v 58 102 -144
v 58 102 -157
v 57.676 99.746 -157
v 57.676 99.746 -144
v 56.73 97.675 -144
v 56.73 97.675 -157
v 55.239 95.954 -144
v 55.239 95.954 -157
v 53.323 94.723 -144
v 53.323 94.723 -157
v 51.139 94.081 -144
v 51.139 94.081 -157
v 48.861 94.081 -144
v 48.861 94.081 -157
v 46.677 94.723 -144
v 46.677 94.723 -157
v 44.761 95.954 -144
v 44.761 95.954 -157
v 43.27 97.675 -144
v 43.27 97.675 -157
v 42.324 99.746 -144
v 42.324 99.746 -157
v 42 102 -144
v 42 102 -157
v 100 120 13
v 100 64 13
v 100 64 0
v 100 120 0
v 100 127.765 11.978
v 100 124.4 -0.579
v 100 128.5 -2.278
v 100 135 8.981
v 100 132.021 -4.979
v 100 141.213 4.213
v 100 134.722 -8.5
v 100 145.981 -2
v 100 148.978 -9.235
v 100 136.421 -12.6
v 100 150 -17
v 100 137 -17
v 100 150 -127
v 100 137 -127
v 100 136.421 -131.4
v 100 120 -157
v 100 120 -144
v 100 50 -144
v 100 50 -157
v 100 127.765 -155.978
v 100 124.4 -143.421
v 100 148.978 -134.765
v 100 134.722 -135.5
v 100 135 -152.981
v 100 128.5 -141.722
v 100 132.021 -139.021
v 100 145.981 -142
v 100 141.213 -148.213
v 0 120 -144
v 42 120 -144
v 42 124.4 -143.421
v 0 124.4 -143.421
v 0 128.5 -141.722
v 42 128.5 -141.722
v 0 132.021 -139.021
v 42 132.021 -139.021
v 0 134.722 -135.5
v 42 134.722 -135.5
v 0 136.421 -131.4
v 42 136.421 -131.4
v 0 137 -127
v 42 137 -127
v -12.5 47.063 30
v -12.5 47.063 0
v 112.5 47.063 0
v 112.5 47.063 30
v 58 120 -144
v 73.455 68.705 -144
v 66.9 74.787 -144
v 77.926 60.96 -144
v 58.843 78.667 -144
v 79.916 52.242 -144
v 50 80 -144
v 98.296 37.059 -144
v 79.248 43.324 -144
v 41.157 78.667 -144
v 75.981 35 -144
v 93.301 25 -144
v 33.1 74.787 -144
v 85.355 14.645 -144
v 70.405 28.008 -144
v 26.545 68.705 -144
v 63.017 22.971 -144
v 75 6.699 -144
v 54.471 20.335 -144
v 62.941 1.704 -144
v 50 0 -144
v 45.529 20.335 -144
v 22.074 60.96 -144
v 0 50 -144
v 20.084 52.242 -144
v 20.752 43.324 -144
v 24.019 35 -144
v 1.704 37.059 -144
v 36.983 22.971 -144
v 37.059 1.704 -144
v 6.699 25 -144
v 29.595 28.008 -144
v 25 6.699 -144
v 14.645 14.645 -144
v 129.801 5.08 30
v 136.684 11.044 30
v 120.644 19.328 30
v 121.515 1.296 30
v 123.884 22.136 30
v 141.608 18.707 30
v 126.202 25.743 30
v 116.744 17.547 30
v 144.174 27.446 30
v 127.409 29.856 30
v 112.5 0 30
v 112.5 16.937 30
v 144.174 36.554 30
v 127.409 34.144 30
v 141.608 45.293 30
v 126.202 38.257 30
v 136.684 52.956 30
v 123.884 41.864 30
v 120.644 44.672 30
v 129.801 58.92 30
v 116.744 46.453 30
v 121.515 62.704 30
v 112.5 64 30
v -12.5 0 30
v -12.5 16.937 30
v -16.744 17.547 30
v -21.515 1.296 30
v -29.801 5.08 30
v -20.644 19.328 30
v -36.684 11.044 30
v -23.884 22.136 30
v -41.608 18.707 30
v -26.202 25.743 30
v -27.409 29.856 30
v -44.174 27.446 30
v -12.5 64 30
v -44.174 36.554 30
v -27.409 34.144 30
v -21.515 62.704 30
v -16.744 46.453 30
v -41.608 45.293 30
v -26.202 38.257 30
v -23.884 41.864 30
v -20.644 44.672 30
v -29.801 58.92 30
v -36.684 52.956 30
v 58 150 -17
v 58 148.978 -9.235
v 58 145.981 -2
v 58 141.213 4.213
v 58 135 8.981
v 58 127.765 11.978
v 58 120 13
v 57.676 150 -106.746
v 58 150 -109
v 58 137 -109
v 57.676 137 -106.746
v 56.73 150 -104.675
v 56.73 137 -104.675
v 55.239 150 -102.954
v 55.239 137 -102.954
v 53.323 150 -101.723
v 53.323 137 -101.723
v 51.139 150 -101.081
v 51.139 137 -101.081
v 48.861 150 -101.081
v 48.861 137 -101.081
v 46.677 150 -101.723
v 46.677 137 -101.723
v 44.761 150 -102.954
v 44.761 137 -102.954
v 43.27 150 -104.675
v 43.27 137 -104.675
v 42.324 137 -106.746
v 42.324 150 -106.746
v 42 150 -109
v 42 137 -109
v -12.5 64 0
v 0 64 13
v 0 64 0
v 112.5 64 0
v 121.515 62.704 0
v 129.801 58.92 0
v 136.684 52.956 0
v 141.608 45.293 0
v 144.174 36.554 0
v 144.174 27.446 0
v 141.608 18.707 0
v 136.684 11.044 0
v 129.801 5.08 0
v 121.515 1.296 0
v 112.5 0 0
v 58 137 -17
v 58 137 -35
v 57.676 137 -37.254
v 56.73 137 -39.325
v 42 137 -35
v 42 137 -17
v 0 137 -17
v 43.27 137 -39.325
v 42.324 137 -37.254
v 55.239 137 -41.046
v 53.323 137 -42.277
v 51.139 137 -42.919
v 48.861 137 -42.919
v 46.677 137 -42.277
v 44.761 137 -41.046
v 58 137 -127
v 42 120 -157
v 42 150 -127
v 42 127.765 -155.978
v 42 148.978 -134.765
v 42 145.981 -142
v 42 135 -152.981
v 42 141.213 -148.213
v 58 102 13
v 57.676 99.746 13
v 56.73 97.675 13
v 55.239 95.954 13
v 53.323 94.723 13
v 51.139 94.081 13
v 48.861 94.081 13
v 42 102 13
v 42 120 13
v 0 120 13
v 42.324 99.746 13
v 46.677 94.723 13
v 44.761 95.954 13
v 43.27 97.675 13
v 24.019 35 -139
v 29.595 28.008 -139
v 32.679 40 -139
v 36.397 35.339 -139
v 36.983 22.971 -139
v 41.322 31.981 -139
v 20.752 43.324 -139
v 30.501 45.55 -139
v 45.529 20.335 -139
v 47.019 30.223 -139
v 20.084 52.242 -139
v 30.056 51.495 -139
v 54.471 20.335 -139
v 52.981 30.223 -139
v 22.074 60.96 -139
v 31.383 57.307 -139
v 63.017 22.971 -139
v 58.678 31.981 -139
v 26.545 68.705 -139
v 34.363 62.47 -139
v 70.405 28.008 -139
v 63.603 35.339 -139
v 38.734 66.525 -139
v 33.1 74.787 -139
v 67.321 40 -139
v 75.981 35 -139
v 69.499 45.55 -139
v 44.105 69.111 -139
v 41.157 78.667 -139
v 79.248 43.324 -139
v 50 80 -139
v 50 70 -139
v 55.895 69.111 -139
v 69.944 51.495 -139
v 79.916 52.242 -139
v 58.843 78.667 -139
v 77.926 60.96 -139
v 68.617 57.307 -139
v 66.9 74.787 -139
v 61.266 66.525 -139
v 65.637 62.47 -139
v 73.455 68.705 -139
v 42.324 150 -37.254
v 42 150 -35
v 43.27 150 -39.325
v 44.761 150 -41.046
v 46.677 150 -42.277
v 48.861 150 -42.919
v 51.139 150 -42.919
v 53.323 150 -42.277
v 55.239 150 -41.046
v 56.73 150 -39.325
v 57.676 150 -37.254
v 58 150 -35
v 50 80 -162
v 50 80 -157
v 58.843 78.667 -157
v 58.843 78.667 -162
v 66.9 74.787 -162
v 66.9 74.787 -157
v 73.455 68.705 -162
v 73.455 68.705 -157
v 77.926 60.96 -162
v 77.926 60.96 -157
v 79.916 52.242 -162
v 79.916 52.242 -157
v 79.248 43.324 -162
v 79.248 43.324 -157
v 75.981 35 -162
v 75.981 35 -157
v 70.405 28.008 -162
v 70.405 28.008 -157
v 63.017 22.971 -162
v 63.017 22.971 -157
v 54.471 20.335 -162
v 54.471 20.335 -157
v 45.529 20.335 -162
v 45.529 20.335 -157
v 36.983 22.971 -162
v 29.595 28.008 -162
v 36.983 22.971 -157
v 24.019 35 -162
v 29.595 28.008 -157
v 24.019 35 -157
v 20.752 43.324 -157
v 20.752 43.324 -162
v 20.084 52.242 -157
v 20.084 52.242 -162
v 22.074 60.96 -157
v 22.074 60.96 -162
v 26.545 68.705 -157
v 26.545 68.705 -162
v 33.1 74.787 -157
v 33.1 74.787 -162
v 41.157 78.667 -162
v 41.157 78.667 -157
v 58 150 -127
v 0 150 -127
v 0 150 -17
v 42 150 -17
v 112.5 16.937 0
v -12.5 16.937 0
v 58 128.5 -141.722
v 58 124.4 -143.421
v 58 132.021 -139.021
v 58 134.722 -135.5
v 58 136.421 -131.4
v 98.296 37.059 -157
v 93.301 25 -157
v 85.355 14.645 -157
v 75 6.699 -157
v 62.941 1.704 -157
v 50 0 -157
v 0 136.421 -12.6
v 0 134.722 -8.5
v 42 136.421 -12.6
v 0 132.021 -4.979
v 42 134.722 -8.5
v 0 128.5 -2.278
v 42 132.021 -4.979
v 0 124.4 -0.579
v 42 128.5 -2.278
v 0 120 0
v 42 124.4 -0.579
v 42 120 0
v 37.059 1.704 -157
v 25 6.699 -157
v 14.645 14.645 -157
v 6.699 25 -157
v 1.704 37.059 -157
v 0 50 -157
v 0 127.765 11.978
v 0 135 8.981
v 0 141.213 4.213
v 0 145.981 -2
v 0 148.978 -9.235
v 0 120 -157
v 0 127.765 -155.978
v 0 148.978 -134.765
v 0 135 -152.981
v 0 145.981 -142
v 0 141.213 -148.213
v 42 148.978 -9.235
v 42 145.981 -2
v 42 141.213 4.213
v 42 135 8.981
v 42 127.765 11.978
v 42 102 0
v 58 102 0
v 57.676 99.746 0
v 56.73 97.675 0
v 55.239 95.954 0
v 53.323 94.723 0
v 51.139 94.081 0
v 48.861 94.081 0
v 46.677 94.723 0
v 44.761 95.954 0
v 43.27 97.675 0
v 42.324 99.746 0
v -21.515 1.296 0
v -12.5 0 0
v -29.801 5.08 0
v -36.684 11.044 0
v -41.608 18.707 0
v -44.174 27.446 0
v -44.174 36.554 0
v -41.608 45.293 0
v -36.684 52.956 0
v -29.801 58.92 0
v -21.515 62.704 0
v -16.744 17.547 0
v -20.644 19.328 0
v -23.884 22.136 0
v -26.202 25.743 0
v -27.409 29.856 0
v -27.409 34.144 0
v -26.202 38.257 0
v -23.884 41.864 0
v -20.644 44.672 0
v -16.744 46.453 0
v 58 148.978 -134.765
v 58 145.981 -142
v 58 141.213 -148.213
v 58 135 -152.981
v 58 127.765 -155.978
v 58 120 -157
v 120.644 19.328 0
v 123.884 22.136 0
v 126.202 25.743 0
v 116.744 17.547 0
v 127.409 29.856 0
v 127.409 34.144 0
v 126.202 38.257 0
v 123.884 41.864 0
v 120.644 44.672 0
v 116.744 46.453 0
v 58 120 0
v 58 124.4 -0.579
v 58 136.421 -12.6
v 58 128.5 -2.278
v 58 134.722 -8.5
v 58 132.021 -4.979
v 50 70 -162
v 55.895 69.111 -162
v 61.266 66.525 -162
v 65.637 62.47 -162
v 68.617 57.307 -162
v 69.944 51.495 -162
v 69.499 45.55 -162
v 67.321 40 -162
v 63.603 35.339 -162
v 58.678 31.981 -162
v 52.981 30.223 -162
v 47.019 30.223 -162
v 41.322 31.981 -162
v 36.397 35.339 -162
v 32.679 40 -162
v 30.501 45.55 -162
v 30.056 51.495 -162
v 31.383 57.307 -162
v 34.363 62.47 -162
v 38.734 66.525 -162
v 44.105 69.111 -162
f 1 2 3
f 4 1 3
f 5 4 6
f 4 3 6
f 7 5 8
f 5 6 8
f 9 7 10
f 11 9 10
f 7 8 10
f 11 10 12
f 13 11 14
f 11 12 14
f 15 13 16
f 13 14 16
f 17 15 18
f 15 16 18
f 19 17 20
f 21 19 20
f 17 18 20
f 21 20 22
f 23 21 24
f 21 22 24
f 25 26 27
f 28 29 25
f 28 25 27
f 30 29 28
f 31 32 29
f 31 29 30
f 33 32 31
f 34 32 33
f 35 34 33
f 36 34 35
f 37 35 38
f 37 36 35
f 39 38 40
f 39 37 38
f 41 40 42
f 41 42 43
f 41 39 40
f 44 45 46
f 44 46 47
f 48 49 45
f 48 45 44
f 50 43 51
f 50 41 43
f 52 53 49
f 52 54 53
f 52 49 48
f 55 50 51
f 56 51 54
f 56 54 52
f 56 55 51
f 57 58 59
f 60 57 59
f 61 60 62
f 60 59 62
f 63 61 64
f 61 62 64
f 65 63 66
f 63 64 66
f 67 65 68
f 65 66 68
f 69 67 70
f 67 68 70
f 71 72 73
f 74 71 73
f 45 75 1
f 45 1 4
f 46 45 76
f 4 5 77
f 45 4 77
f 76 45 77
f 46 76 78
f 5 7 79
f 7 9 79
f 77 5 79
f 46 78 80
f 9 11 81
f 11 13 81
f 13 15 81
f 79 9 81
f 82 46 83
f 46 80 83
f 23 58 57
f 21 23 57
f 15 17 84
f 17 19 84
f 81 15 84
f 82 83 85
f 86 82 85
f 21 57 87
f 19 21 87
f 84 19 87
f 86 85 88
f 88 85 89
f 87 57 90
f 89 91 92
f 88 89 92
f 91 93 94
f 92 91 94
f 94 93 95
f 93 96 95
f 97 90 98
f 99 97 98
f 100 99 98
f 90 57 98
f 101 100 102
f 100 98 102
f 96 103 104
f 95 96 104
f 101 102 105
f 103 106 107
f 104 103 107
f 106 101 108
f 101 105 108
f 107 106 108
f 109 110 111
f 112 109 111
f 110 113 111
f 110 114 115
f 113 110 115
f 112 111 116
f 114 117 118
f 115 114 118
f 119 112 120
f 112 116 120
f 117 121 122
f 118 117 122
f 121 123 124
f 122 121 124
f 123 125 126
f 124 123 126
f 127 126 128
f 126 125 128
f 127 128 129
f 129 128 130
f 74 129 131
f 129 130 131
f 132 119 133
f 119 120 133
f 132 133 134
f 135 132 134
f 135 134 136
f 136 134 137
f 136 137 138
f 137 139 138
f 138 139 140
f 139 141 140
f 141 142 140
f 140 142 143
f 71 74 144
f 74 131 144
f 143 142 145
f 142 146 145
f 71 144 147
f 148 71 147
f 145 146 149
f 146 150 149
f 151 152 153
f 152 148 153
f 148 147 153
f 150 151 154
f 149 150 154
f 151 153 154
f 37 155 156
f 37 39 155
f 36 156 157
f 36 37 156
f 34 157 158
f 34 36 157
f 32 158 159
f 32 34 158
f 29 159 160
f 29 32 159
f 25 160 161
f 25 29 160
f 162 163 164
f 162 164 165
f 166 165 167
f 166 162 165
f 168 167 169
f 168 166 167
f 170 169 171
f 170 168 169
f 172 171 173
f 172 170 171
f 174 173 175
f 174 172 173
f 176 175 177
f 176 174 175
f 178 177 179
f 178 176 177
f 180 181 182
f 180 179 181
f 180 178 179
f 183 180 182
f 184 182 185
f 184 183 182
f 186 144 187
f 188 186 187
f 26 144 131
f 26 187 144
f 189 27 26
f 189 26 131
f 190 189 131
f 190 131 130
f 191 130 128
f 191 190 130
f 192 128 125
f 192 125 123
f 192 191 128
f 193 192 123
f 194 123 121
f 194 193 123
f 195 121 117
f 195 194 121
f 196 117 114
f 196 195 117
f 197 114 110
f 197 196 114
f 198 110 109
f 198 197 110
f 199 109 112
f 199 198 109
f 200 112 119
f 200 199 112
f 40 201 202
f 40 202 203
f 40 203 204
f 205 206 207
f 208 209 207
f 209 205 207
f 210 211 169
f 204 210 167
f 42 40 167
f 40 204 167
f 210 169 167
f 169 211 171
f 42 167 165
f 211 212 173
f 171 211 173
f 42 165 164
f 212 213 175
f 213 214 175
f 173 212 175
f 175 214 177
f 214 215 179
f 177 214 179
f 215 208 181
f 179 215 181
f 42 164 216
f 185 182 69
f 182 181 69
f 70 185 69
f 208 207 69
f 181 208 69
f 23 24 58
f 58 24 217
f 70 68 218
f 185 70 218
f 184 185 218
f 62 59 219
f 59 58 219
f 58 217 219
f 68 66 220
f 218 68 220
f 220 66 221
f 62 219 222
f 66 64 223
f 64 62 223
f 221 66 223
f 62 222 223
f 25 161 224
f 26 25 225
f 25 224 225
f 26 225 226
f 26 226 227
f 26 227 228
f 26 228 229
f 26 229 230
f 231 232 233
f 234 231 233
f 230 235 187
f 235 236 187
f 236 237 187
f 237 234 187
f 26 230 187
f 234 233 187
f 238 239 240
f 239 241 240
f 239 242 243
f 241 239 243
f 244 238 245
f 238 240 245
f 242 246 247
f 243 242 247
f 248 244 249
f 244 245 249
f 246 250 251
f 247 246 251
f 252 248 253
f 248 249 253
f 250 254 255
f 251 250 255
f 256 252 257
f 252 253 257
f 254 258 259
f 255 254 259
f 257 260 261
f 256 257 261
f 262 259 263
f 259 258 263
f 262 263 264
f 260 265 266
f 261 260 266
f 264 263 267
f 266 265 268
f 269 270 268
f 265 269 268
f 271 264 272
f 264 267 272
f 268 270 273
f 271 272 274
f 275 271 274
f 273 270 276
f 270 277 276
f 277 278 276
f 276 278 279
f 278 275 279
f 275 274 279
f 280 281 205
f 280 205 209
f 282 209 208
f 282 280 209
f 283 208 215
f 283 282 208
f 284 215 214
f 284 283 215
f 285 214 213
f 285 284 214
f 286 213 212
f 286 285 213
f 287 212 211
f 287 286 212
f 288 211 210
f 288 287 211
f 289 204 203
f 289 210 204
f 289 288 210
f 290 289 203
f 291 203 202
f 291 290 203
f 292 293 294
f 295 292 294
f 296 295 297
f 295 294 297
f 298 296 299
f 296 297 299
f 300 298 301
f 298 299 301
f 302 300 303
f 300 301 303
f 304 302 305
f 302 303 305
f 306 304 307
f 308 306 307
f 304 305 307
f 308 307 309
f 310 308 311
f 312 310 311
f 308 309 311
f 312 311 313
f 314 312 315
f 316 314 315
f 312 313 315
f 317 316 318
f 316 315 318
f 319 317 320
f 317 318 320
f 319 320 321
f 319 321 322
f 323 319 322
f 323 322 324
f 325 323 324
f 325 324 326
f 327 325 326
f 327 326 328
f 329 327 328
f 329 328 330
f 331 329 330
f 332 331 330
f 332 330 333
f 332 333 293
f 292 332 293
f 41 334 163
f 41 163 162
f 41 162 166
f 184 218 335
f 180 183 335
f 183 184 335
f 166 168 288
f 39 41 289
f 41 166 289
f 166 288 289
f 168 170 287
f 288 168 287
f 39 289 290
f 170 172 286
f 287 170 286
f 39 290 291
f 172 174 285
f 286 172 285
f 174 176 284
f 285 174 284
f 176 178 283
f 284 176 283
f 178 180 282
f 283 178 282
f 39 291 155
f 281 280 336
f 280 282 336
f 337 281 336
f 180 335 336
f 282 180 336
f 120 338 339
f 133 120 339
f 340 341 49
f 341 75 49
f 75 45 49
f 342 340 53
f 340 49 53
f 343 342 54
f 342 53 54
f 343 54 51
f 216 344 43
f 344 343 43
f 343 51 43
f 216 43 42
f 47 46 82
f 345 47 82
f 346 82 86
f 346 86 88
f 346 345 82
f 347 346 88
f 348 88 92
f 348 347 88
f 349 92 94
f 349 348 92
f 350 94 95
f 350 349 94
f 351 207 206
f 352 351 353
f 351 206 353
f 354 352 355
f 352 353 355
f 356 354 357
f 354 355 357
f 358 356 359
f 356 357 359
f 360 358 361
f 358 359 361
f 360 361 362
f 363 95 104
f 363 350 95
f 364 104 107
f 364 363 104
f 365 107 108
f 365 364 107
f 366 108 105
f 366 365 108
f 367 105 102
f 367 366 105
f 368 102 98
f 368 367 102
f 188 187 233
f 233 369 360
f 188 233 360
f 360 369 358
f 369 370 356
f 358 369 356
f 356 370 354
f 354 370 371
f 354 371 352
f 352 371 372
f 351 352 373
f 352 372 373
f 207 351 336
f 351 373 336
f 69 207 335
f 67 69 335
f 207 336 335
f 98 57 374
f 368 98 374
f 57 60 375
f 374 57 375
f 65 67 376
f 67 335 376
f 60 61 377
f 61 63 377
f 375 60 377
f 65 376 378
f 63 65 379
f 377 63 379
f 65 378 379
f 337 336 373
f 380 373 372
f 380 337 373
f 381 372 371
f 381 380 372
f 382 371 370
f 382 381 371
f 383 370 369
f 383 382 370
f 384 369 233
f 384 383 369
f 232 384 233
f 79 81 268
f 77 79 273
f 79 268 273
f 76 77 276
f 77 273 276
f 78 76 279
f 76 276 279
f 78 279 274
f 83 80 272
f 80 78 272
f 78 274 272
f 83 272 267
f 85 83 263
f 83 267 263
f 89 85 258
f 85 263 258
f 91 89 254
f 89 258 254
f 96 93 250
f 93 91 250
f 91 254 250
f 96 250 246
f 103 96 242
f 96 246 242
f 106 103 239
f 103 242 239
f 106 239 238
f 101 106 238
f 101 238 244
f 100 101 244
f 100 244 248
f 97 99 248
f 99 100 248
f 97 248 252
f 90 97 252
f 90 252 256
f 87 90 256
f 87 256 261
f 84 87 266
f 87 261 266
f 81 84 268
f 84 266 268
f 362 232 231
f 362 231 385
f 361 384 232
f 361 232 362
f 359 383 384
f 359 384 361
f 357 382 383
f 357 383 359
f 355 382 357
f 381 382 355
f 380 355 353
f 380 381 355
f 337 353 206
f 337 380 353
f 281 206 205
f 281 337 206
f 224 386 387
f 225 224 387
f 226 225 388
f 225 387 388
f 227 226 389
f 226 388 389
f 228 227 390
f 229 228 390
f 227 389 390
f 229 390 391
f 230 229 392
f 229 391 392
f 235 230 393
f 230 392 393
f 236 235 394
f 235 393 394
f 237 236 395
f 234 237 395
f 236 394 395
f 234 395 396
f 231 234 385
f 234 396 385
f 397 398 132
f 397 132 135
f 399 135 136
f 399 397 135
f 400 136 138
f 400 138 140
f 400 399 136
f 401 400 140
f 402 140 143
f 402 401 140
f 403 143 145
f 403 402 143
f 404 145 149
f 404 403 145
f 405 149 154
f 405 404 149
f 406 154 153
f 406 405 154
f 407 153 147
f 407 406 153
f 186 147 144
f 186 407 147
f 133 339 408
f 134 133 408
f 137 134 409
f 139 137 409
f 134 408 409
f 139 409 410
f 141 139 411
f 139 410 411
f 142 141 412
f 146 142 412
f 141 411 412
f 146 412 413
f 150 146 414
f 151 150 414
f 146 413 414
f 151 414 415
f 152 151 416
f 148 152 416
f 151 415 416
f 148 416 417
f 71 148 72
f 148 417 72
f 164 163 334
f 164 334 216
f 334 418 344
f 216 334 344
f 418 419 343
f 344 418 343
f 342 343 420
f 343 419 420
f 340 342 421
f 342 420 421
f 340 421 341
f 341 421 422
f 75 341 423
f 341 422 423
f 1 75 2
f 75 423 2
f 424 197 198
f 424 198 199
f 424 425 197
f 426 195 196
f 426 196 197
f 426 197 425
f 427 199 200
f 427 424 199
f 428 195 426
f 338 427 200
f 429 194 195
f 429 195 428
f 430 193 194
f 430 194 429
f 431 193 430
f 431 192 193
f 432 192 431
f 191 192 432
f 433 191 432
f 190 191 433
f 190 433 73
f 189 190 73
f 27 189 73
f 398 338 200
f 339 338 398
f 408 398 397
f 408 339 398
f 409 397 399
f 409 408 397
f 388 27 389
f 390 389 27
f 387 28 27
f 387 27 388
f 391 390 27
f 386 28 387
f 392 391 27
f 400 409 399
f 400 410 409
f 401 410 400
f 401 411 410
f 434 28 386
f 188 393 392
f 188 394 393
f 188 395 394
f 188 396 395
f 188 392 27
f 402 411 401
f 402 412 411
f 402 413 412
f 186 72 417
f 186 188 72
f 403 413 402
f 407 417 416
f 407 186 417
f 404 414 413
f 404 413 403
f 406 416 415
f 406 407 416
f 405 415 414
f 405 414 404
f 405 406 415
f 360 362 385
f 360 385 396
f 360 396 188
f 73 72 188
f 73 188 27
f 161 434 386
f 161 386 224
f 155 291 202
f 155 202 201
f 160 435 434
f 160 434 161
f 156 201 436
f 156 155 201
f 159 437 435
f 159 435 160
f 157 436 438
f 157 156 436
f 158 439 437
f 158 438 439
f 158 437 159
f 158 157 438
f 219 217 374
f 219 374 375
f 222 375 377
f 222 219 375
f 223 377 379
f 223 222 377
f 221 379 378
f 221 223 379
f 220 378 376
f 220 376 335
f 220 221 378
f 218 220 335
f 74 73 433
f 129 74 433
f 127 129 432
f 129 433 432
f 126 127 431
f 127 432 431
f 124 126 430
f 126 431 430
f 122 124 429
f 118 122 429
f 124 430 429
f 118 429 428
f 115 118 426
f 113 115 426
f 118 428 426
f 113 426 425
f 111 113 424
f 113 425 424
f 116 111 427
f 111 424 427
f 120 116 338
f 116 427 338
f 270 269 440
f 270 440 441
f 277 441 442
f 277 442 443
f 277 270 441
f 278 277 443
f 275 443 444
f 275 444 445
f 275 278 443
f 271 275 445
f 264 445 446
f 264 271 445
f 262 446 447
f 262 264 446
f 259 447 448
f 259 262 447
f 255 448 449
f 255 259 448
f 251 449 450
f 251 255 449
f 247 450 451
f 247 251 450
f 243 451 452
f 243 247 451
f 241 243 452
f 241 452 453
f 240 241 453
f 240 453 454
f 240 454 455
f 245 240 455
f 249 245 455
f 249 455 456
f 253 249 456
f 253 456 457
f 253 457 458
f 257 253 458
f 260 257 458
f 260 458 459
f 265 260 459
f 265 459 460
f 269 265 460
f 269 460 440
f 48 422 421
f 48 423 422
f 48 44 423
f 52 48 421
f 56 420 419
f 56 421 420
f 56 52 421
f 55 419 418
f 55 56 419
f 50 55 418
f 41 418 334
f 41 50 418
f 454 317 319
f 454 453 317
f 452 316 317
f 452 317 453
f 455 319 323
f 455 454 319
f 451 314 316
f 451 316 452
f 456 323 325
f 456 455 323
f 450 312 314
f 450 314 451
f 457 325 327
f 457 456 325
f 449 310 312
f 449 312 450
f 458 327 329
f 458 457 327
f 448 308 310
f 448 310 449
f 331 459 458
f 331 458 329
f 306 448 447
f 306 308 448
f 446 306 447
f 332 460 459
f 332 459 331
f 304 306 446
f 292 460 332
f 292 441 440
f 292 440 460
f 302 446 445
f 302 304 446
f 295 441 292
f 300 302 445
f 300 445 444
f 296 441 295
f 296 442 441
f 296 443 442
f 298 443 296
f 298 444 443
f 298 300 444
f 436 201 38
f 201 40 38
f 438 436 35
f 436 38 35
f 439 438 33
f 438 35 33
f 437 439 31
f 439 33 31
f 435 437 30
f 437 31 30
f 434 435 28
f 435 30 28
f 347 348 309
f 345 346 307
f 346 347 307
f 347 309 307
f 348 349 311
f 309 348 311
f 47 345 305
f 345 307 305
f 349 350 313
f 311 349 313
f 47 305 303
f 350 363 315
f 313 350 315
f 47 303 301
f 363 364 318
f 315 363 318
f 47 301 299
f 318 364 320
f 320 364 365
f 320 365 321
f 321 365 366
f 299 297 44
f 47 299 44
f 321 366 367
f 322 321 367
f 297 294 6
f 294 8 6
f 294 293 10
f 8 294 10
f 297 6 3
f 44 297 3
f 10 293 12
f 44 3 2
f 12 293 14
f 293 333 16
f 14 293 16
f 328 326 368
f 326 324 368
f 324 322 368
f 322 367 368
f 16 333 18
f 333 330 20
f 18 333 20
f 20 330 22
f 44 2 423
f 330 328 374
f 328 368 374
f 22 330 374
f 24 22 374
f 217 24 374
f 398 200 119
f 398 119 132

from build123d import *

# Parameters (mm, degrees)
BOSS_EXTRUDE1_DEPTH      = 100
FILLET1_R                = 30
FILLET2_R                = 17
BOSS_EXTRUDE2_DEPTH      = 17
BOSS_EXTRUDE2_DEPTH_BACK = 13
CUT_EXTRUDE1_START       = -17
SKETCH2_4_W              = 100
SKETCH2_4_H              = 30.125527048
CUT_EXTRUDE1_DEPTH       = 17
FILLET3_R                = 50
BOSS_EXTRUDE3_DEPTH      = 5
BOSS_EXTRUDE3_DEPTH_BACK = 18
SKETCH3_R                = 30
SKETCH3_R_2              = 20
SKETCH3_2_R              = 20
CUT_EXTRUDE2_DEPTH       = 25
CUT_EXTRUDE3_DEPTH       = 25
CUT_EXTRUDE4_DEPTH       = 25
CUT_EXTRUDE5_START       = -25
CUT_EXTRUDE5_DEPTH       = 25


with BuildPart() as part:
    # Sketch1 → Boss-Extrude1 (new body)
    with BuildSketch(Plane(origin=(0, 0, 0), x_dir=(0, 0, -1), z_dir=(1, 0, 0))):
        Polygon((0, 0), (0, 137), (144, 137), (144, 0), (157, 0), (157, 150), (-13, 150), (-13, 0), align=None)
    extrude(amount=BOSS_EXTRUDE1_DEPTH)

    # Fillet1
    fillet1_edges = [part.edges().sort_by_distance(p)[0] for p in [
        (50, 150, -157),
        (50, 150, 13),
    ]]
    fillet(fillet1_edges, radius=FILLET1_R)

    # Fillet2
    fillet2_edges = [part.edges().sort_by_distance(p)[0] for p in [
        (50, 137, 0),
        (50, 137, -144),
    ]]
    fillet(fillet2_edges, radius=FILLET2_R)

    # Sketch2 → Boss-Extrude2 (add, two sides: drawn at the far end of the back side and taken through both)
    with BuildSketch(Plane.XY.offset(13).offset(-BOSS_EXTRUDE2_DEPTH_BACK)):
        with BuildLine():
            Line((-12.5, 64), (112.5, 64))
            ThreePointArc((112.5, 64), (144.5, 32), (112.5, 0))
            Line((112.5, 0), (-12.5, 0))
            ThreePointArc((-12.5, 0), (-44.5, 32), (-12.5, 64))
        make_face()
        with BuildLine():
            Line((-12.5, 47.062763524), (112.5, 47.062763524))
            ThreePointArc((112.5, 47.062763524), (127.562763524, 32), (112.5, 16.937236476))
            Line((112.5, 16.937236476), (-12.5, 16.937236476))
            ThreePointArc((-12.5, 16.937236476), (-27.562763524, 32), (-12.5, 47.062763524))
        make_face(mode=Mode.SUBTRACT)
    extrude(amount=BOSS_EXTRUDE2_DEPTH + BOSS_EXTRUDE2_DEPTH_BACK)

    # Sketch2<4> → Cut-Extrude1 (cut)
    with BuildSketch(Plane.XY.offset(13).offset(CUT_EXTRUDE1_START)):
        with BuildLine():
            Line((0, 16.937236476), (0, 47.062763524))
            Line((0, 47.062763524), (-12.5, 47.062763524))
            ThreePointArc((-12.5, 47.062763524), (-27.562763524, 32), (-12.5, 16.937236476))
            Line((-12.5, 16.937236476), (0, 16.937236476))
        make_face()
        with Locations((50, 32)):
            Rectangle(SKETCH2_4_W, SKETCH2_4_H)
        with BuildLine():
            Line((112.5, 47.062763524), (100, 47.062763524))
            Line((100, 47.062763524), (100, 16.937236476))
            Line((100, 16.937236476), (112.5, 16.937236476))
            ThreePointArc((112.5, 16.937236476), (127.562763524, 32), (112.5, 47.062763524))
        make_face()
    extrude(amount=CUT_EXTRUDE1_DEPTH, mode=Mode.SUBTRACT)

    # Fillet3
    fillet3_edges = [part.edges().sort_by_distance(p)[0] for p in [
        (0, 0, -150.5),
        (100, 0, -150.5),
    ]]
    fillet(fillet3_edges, radius=FILLET3_R - 0.0001)  # a hair under: the kernel refuses the full size

    # Sketch3 → Boss-Extrude3 (add, two sides: drawn at the far end of the back side and taken through both)
    with BuildSketch(Plane(origin=(0, 0, -157), x_dir=(-1, 0, 0), z_dir=(0, 0, -1)).offset(-BOSS_EXTRUDE3_DEPTH_BACK)):
        with Locations(Location((-50, 50, 0), (0, 0, 90))):
            Circle(SKETCH3_R)
        with Locations(Location((-50, 50, 0), (0, 0, 90))):
            Circle(SKETCH3_R_2, mode=Mode.SUBTRACT)
    extrude(amount=BOSS_EXTRUDE3_DEPTH + BOSS_EXTRUDE3_DEPTH_BACK)

    # Sketch3<2> → Cut-Extrude2 (cut)
    with BuildSketch(Plane(origin=(0, 0, -157), x_dir=(-1, 0, 0), z_dir=(0, 0, -1))):
        with Locations(Location((-50, 50, 0), (0, 0, 90))):
            Circle(SKETCH3_2_R)
    extrude(amount=-CUT_EXTRUDE2_DEPTH, mode=Mode.SUBTRACT)

    # Sketch4 → Cut-Extrude3 (cut)
    with BuildSketch(Plane(origin=(0, 0, -157), x_dir=(-1, 0, 0), z_dir=(0, 0, -1))):
        with BuildLine():
            Line((-58, 150), (-58, 102))
            ThreePointArc((-58, 102), (-50, 94), (-42, 102))
            Line((-42, 102), (-42, 150))
            ThreePointArc((-42, 150), (-50, 158), (-58, 150))
        make_face()
    extrude(amount=-CUT_EXTRUDE3_DEPTH, mode=Mode.SUBTRACT)

    # Sketch5 → Cut-Extrude4 (cut)
    with BuildSketch(Plane(origin=(0, 150, 0), x_dir=(1, 0, 0), z_dir=(0, 1, 0))):
        with BuildLine():
            Line((58, 157), (58, 109))
            ThreePointArc((58, 109), (50, 101), (42, 109))
            Line((42, 109), (42, 157))
            ThreePointArc((42, 157), (50, 165), (58, 157))
        make_face()
        with BuildLine():
            Line((42, -13), (42, 35))
            ThreePointArc((42, 35), (50, 43), (58, 35))
            Line((58, 35), (58, -13))
            ThreePointArc((58, -13), (50, -21), (42, -13))
        make_face()
    extrude(amount=-CUT_EXTRUDE4_DEPTH, mode=Mode.SUBTRACT)

    # Sketch6 → Cut-Extrude5 (cut)
    with BuildSketch(Plane.XY.offset(13).offset(CUT_EXTRUDE5_START)):
        with BuildLine():
            Line((58, 150), (58, 102))
            ThreePointArc((58, 102), (50, 94), (42, 102))
            Line((42, 102), (42, 150))
            ThreePointArc((42, 150), (50, 158), (58, 150))
        make_face()
    extrude(amount=CUT_EXTRUDE5_DEPTH, mode=Mode.SUBTRACT)


solid = part.part
